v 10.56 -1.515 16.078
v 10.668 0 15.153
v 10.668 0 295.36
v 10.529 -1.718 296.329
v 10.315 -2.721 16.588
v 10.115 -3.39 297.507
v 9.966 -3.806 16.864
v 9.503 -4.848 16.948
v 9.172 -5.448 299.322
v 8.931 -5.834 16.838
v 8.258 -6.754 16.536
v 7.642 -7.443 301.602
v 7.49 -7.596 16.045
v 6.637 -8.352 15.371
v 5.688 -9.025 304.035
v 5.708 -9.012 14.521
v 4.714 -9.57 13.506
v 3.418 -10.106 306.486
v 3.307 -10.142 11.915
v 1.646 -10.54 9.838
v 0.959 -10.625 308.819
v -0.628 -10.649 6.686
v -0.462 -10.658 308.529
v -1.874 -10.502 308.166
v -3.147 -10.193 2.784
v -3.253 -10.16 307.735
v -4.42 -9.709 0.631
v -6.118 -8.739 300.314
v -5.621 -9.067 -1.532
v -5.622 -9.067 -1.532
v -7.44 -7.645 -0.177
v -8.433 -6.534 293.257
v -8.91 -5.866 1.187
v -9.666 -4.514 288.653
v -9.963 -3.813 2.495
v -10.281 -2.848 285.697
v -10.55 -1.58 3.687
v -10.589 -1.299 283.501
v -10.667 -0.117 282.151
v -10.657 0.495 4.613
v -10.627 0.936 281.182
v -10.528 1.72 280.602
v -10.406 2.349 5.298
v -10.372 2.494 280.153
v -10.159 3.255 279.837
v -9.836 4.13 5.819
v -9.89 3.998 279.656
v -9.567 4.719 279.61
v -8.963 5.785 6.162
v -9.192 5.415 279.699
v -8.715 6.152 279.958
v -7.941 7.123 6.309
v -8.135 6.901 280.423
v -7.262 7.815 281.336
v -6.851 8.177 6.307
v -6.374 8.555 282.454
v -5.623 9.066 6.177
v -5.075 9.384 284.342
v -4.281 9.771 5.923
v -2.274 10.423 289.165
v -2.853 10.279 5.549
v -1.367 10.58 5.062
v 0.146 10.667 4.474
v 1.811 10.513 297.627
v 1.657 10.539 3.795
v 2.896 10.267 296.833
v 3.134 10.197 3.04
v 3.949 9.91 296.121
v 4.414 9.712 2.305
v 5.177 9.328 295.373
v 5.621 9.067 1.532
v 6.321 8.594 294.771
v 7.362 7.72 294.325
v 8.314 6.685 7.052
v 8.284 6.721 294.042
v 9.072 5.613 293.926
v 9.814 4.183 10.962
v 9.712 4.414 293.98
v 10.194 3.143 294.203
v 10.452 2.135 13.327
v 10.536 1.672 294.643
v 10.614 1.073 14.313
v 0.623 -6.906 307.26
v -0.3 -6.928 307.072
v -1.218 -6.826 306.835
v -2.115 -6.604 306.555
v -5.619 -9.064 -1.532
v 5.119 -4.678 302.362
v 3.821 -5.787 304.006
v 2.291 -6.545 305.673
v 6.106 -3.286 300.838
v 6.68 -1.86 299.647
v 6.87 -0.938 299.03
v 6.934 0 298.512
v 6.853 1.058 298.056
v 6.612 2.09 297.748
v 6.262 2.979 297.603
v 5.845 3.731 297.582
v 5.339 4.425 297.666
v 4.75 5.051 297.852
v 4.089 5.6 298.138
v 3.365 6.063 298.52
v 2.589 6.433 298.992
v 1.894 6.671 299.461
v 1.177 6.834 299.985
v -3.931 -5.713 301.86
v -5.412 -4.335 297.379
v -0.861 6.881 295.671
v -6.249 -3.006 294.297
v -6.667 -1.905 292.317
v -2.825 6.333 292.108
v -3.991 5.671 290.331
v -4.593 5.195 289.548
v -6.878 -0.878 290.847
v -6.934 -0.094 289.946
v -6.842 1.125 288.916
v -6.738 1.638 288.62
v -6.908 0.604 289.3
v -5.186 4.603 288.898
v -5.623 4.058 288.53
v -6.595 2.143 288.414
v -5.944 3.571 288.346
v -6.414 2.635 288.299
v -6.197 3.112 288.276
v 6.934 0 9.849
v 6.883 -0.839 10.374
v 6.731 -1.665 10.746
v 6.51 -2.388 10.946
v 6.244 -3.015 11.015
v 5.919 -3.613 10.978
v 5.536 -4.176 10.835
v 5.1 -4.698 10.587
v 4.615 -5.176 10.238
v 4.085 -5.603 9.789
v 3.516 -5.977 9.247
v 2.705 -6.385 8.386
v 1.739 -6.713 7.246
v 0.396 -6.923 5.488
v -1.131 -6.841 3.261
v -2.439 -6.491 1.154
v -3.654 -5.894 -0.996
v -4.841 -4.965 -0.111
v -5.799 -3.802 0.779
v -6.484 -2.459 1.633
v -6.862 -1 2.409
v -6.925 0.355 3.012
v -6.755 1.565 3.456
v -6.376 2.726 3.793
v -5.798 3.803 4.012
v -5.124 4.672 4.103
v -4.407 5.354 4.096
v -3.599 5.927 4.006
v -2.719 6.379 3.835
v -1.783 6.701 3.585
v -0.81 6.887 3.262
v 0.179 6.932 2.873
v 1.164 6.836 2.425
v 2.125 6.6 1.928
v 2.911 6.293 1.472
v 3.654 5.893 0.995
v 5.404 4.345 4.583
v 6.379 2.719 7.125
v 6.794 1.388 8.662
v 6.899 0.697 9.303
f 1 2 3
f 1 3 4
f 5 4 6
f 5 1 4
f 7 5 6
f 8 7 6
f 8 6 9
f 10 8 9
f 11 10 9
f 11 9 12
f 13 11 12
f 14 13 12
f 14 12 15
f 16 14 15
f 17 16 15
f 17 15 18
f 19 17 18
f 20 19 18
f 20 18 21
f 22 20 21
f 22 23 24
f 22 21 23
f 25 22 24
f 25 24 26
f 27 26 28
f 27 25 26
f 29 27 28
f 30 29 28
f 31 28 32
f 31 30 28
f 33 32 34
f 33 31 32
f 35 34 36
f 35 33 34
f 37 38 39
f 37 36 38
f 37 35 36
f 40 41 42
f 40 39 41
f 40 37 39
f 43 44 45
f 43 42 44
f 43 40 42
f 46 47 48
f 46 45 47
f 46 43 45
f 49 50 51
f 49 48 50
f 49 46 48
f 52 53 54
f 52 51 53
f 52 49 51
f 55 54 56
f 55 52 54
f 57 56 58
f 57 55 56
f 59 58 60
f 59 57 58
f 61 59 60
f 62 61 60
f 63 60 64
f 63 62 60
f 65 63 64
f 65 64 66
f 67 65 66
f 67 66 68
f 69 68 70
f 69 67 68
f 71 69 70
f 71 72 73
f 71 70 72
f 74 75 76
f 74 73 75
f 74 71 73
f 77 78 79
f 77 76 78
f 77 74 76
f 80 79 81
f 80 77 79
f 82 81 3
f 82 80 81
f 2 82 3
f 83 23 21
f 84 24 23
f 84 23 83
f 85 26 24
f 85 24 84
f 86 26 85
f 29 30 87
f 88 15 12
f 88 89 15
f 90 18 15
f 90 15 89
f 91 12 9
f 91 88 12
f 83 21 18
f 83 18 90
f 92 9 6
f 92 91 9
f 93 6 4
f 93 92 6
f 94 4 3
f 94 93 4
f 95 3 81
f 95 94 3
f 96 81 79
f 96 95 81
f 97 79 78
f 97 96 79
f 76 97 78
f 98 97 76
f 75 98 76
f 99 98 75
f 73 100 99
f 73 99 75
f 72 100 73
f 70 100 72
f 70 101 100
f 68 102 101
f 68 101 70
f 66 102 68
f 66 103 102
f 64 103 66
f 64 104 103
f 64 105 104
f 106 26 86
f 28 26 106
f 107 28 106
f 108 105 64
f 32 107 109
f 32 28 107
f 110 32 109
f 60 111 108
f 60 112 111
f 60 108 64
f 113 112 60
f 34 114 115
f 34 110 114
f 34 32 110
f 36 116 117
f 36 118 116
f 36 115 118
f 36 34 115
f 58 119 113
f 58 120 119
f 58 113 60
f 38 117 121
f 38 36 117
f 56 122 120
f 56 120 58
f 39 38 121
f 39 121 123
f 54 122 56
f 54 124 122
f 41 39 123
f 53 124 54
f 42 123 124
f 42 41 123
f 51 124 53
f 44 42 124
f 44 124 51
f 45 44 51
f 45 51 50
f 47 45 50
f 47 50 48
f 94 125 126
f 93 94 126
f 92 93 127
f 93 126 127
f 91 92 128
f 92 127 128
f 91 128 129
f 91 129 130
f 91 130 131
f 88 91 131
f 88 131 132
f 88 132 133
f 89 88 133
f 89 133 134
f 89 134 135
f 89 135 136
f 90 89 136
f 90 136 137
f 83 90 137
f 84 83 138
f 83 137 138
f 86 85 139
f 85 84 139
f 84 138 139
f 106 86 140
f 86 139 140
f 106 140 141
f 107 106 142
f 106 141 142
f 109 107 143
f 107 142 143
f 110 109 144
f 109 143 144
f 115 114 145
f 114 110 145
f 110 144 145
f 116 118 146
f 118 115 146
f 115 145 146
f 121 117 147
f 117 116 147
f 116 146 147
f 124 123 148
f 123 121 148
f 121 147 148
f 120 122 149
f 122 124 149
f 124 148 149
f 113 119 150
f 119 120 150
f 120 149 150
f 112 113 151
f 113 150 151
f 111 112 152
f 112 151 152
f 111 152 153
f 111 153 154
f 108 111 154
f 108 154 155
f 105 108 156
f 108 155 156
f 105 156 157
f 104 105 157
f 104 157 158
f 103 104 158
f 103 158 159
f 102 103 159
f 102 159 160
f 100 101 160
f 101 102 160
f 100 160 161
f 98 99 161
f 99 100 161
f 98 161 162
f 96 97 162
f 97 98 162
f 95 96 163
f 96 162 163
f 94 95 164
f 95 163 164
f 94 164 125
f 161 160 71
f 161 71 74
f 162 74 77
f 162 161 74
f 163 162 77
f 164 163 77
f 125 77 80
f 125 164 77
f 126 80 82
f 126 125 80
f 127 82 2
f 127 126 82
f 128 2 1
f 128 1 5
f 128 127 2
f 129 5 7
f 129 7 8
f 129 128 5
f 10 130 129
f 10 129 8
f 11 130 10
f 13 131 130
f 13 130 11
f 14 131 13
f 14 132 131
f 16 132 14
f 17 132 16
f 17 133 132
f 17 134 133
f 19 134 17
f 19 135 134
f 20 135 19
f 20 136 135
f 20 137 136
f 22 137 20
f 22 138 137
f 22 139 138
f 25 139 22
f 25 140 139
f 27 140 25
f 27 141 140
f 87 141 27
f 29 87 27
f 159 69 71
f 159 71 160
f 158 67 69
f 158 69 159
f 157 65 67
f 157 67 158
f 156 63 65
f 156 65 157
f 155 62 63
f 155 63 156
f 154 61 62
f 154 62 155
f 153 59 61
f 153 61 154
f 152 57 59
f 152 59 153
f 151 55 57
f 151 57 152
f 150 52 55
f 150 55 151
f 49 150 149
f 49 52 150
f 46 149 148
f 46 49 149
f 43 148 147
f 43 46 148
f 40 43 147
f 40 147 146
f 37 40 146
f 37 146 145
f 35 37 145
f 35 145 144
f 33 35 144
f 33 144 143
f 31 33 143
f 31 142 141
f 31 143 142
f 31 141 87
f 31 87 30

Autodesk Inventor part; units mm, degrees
ref_plane "Start Plane" through (0, 0, -1.5322) normal (0, 0, 1) x (1, 0, 0)
ref_plane "End Plane" through (0, 0, 308.8193) normal (0, 0, 1) x (1, 0, 0)
sketch "Sketch" plane through (0, 0, 0) normal (0, 0, 1) x (1, 0, 0)
  circle A0 centre (0, 0) radius 6.9342
  circle A1 centre (0, 0) radius 10.668
  dimension "d0" = 21.336
  dimension "d1" = 3.7338
extrude "Body" add sketch "Sketch" along normal up to surface (310.3515 mm away) from surface at -1.5322
sketch "Sketch3" plane through (0, 0, 0) normal (0, 0, 1) x (1, 0, 0)
  line L0 (0, 0) -> (10, 0)
ref_plane "Work Plane3" through (0, 0, 0) normal (0, -1, 0) x (1, 0, 0)
sketch "Sketch4" plane through (0, 0, 0) normal (0, -1, 0) x (1, 0, 0)
  line L0 (-2, -1.5322) -> (12, -1.5322)
  line L1 (-2, 308.8193) -> (12, 308.8193)
  dimension "d7" = 310.3515
ref_plane "Work Plane4" through (-9.2, -5.4006, 314.8045) normal (0.6032, 0.3541, 0.7147) x (0.7878, -0.1245, -0.6032)
split "Split1" plane through (-9.2, -5.4006, 314.8045) removes the side toward (0.6032, 0.3541, 0.7147)
ref_plane "Work Plane5" through (5.0201, -9.413, 309.2009) normal (-0.1943, 0.3643, 0.9108) x (0.9802, 0.037, 0.1943)
split "Split2" plane through (5.0201, -9.413, 309.2009) removes the side toward (-0.1943, 0.3643, 0.9108)
ref_plane "Work Plane6" through (9.6229, -4.605, 329.1254) normal (-0.8284, 0.3964, 0.3957) x (0.5083, 0.2353, 0.8284)
split "Split3" plane through (9.6229, -4.605, 329.1254) removes the side toward (-0.8284, 0.3964, 0.3957)
ref_plane "Work Plane7" through (-9.538, 4.7783, -16.9501) normal (0.7567, -0.3791, -0.5327) x (-0.2252, 0.6138, -0.7567)
split "Split4" plane through (-9.538, 4.7783, -16.9501) removes the side toward (0.7567, -0.3791, -0.5327)
ref_plane "Work Plane8" through (7.4352, -7.6501, -6.3246) normal (-0.3554, 0.3657, -0.8602) x (0.0964, 0.9297, 0.3554)
split "Split5" plane through (7.4352, -7.6501, -6.3246) removes the side toward (-0.3554, 0.3657, -0.8602)
equation "\"d0\" = G_H"
equation "\"d1\" = G_T"
equation "\"d2\" = G_L"
equation "\"G_H\" = 21.336"
equation "\"G_T\" = 3.7338"
equation "\"G_L\" = 310.35153"
equation "\"G_OFFSET_START\" = 1.53222"
equation "\"G_OFFSET_END\" = 4.45413"
equation "\"d4\" = -G_OFFSET_START"
equation "\"d5\" = G_OFFSET_END + B_L"
equation "\"B_L\" = 304.36517"
properties part number "ANSI - 1/2 x 0.147 - 12.219" material "Steel, Mild"
